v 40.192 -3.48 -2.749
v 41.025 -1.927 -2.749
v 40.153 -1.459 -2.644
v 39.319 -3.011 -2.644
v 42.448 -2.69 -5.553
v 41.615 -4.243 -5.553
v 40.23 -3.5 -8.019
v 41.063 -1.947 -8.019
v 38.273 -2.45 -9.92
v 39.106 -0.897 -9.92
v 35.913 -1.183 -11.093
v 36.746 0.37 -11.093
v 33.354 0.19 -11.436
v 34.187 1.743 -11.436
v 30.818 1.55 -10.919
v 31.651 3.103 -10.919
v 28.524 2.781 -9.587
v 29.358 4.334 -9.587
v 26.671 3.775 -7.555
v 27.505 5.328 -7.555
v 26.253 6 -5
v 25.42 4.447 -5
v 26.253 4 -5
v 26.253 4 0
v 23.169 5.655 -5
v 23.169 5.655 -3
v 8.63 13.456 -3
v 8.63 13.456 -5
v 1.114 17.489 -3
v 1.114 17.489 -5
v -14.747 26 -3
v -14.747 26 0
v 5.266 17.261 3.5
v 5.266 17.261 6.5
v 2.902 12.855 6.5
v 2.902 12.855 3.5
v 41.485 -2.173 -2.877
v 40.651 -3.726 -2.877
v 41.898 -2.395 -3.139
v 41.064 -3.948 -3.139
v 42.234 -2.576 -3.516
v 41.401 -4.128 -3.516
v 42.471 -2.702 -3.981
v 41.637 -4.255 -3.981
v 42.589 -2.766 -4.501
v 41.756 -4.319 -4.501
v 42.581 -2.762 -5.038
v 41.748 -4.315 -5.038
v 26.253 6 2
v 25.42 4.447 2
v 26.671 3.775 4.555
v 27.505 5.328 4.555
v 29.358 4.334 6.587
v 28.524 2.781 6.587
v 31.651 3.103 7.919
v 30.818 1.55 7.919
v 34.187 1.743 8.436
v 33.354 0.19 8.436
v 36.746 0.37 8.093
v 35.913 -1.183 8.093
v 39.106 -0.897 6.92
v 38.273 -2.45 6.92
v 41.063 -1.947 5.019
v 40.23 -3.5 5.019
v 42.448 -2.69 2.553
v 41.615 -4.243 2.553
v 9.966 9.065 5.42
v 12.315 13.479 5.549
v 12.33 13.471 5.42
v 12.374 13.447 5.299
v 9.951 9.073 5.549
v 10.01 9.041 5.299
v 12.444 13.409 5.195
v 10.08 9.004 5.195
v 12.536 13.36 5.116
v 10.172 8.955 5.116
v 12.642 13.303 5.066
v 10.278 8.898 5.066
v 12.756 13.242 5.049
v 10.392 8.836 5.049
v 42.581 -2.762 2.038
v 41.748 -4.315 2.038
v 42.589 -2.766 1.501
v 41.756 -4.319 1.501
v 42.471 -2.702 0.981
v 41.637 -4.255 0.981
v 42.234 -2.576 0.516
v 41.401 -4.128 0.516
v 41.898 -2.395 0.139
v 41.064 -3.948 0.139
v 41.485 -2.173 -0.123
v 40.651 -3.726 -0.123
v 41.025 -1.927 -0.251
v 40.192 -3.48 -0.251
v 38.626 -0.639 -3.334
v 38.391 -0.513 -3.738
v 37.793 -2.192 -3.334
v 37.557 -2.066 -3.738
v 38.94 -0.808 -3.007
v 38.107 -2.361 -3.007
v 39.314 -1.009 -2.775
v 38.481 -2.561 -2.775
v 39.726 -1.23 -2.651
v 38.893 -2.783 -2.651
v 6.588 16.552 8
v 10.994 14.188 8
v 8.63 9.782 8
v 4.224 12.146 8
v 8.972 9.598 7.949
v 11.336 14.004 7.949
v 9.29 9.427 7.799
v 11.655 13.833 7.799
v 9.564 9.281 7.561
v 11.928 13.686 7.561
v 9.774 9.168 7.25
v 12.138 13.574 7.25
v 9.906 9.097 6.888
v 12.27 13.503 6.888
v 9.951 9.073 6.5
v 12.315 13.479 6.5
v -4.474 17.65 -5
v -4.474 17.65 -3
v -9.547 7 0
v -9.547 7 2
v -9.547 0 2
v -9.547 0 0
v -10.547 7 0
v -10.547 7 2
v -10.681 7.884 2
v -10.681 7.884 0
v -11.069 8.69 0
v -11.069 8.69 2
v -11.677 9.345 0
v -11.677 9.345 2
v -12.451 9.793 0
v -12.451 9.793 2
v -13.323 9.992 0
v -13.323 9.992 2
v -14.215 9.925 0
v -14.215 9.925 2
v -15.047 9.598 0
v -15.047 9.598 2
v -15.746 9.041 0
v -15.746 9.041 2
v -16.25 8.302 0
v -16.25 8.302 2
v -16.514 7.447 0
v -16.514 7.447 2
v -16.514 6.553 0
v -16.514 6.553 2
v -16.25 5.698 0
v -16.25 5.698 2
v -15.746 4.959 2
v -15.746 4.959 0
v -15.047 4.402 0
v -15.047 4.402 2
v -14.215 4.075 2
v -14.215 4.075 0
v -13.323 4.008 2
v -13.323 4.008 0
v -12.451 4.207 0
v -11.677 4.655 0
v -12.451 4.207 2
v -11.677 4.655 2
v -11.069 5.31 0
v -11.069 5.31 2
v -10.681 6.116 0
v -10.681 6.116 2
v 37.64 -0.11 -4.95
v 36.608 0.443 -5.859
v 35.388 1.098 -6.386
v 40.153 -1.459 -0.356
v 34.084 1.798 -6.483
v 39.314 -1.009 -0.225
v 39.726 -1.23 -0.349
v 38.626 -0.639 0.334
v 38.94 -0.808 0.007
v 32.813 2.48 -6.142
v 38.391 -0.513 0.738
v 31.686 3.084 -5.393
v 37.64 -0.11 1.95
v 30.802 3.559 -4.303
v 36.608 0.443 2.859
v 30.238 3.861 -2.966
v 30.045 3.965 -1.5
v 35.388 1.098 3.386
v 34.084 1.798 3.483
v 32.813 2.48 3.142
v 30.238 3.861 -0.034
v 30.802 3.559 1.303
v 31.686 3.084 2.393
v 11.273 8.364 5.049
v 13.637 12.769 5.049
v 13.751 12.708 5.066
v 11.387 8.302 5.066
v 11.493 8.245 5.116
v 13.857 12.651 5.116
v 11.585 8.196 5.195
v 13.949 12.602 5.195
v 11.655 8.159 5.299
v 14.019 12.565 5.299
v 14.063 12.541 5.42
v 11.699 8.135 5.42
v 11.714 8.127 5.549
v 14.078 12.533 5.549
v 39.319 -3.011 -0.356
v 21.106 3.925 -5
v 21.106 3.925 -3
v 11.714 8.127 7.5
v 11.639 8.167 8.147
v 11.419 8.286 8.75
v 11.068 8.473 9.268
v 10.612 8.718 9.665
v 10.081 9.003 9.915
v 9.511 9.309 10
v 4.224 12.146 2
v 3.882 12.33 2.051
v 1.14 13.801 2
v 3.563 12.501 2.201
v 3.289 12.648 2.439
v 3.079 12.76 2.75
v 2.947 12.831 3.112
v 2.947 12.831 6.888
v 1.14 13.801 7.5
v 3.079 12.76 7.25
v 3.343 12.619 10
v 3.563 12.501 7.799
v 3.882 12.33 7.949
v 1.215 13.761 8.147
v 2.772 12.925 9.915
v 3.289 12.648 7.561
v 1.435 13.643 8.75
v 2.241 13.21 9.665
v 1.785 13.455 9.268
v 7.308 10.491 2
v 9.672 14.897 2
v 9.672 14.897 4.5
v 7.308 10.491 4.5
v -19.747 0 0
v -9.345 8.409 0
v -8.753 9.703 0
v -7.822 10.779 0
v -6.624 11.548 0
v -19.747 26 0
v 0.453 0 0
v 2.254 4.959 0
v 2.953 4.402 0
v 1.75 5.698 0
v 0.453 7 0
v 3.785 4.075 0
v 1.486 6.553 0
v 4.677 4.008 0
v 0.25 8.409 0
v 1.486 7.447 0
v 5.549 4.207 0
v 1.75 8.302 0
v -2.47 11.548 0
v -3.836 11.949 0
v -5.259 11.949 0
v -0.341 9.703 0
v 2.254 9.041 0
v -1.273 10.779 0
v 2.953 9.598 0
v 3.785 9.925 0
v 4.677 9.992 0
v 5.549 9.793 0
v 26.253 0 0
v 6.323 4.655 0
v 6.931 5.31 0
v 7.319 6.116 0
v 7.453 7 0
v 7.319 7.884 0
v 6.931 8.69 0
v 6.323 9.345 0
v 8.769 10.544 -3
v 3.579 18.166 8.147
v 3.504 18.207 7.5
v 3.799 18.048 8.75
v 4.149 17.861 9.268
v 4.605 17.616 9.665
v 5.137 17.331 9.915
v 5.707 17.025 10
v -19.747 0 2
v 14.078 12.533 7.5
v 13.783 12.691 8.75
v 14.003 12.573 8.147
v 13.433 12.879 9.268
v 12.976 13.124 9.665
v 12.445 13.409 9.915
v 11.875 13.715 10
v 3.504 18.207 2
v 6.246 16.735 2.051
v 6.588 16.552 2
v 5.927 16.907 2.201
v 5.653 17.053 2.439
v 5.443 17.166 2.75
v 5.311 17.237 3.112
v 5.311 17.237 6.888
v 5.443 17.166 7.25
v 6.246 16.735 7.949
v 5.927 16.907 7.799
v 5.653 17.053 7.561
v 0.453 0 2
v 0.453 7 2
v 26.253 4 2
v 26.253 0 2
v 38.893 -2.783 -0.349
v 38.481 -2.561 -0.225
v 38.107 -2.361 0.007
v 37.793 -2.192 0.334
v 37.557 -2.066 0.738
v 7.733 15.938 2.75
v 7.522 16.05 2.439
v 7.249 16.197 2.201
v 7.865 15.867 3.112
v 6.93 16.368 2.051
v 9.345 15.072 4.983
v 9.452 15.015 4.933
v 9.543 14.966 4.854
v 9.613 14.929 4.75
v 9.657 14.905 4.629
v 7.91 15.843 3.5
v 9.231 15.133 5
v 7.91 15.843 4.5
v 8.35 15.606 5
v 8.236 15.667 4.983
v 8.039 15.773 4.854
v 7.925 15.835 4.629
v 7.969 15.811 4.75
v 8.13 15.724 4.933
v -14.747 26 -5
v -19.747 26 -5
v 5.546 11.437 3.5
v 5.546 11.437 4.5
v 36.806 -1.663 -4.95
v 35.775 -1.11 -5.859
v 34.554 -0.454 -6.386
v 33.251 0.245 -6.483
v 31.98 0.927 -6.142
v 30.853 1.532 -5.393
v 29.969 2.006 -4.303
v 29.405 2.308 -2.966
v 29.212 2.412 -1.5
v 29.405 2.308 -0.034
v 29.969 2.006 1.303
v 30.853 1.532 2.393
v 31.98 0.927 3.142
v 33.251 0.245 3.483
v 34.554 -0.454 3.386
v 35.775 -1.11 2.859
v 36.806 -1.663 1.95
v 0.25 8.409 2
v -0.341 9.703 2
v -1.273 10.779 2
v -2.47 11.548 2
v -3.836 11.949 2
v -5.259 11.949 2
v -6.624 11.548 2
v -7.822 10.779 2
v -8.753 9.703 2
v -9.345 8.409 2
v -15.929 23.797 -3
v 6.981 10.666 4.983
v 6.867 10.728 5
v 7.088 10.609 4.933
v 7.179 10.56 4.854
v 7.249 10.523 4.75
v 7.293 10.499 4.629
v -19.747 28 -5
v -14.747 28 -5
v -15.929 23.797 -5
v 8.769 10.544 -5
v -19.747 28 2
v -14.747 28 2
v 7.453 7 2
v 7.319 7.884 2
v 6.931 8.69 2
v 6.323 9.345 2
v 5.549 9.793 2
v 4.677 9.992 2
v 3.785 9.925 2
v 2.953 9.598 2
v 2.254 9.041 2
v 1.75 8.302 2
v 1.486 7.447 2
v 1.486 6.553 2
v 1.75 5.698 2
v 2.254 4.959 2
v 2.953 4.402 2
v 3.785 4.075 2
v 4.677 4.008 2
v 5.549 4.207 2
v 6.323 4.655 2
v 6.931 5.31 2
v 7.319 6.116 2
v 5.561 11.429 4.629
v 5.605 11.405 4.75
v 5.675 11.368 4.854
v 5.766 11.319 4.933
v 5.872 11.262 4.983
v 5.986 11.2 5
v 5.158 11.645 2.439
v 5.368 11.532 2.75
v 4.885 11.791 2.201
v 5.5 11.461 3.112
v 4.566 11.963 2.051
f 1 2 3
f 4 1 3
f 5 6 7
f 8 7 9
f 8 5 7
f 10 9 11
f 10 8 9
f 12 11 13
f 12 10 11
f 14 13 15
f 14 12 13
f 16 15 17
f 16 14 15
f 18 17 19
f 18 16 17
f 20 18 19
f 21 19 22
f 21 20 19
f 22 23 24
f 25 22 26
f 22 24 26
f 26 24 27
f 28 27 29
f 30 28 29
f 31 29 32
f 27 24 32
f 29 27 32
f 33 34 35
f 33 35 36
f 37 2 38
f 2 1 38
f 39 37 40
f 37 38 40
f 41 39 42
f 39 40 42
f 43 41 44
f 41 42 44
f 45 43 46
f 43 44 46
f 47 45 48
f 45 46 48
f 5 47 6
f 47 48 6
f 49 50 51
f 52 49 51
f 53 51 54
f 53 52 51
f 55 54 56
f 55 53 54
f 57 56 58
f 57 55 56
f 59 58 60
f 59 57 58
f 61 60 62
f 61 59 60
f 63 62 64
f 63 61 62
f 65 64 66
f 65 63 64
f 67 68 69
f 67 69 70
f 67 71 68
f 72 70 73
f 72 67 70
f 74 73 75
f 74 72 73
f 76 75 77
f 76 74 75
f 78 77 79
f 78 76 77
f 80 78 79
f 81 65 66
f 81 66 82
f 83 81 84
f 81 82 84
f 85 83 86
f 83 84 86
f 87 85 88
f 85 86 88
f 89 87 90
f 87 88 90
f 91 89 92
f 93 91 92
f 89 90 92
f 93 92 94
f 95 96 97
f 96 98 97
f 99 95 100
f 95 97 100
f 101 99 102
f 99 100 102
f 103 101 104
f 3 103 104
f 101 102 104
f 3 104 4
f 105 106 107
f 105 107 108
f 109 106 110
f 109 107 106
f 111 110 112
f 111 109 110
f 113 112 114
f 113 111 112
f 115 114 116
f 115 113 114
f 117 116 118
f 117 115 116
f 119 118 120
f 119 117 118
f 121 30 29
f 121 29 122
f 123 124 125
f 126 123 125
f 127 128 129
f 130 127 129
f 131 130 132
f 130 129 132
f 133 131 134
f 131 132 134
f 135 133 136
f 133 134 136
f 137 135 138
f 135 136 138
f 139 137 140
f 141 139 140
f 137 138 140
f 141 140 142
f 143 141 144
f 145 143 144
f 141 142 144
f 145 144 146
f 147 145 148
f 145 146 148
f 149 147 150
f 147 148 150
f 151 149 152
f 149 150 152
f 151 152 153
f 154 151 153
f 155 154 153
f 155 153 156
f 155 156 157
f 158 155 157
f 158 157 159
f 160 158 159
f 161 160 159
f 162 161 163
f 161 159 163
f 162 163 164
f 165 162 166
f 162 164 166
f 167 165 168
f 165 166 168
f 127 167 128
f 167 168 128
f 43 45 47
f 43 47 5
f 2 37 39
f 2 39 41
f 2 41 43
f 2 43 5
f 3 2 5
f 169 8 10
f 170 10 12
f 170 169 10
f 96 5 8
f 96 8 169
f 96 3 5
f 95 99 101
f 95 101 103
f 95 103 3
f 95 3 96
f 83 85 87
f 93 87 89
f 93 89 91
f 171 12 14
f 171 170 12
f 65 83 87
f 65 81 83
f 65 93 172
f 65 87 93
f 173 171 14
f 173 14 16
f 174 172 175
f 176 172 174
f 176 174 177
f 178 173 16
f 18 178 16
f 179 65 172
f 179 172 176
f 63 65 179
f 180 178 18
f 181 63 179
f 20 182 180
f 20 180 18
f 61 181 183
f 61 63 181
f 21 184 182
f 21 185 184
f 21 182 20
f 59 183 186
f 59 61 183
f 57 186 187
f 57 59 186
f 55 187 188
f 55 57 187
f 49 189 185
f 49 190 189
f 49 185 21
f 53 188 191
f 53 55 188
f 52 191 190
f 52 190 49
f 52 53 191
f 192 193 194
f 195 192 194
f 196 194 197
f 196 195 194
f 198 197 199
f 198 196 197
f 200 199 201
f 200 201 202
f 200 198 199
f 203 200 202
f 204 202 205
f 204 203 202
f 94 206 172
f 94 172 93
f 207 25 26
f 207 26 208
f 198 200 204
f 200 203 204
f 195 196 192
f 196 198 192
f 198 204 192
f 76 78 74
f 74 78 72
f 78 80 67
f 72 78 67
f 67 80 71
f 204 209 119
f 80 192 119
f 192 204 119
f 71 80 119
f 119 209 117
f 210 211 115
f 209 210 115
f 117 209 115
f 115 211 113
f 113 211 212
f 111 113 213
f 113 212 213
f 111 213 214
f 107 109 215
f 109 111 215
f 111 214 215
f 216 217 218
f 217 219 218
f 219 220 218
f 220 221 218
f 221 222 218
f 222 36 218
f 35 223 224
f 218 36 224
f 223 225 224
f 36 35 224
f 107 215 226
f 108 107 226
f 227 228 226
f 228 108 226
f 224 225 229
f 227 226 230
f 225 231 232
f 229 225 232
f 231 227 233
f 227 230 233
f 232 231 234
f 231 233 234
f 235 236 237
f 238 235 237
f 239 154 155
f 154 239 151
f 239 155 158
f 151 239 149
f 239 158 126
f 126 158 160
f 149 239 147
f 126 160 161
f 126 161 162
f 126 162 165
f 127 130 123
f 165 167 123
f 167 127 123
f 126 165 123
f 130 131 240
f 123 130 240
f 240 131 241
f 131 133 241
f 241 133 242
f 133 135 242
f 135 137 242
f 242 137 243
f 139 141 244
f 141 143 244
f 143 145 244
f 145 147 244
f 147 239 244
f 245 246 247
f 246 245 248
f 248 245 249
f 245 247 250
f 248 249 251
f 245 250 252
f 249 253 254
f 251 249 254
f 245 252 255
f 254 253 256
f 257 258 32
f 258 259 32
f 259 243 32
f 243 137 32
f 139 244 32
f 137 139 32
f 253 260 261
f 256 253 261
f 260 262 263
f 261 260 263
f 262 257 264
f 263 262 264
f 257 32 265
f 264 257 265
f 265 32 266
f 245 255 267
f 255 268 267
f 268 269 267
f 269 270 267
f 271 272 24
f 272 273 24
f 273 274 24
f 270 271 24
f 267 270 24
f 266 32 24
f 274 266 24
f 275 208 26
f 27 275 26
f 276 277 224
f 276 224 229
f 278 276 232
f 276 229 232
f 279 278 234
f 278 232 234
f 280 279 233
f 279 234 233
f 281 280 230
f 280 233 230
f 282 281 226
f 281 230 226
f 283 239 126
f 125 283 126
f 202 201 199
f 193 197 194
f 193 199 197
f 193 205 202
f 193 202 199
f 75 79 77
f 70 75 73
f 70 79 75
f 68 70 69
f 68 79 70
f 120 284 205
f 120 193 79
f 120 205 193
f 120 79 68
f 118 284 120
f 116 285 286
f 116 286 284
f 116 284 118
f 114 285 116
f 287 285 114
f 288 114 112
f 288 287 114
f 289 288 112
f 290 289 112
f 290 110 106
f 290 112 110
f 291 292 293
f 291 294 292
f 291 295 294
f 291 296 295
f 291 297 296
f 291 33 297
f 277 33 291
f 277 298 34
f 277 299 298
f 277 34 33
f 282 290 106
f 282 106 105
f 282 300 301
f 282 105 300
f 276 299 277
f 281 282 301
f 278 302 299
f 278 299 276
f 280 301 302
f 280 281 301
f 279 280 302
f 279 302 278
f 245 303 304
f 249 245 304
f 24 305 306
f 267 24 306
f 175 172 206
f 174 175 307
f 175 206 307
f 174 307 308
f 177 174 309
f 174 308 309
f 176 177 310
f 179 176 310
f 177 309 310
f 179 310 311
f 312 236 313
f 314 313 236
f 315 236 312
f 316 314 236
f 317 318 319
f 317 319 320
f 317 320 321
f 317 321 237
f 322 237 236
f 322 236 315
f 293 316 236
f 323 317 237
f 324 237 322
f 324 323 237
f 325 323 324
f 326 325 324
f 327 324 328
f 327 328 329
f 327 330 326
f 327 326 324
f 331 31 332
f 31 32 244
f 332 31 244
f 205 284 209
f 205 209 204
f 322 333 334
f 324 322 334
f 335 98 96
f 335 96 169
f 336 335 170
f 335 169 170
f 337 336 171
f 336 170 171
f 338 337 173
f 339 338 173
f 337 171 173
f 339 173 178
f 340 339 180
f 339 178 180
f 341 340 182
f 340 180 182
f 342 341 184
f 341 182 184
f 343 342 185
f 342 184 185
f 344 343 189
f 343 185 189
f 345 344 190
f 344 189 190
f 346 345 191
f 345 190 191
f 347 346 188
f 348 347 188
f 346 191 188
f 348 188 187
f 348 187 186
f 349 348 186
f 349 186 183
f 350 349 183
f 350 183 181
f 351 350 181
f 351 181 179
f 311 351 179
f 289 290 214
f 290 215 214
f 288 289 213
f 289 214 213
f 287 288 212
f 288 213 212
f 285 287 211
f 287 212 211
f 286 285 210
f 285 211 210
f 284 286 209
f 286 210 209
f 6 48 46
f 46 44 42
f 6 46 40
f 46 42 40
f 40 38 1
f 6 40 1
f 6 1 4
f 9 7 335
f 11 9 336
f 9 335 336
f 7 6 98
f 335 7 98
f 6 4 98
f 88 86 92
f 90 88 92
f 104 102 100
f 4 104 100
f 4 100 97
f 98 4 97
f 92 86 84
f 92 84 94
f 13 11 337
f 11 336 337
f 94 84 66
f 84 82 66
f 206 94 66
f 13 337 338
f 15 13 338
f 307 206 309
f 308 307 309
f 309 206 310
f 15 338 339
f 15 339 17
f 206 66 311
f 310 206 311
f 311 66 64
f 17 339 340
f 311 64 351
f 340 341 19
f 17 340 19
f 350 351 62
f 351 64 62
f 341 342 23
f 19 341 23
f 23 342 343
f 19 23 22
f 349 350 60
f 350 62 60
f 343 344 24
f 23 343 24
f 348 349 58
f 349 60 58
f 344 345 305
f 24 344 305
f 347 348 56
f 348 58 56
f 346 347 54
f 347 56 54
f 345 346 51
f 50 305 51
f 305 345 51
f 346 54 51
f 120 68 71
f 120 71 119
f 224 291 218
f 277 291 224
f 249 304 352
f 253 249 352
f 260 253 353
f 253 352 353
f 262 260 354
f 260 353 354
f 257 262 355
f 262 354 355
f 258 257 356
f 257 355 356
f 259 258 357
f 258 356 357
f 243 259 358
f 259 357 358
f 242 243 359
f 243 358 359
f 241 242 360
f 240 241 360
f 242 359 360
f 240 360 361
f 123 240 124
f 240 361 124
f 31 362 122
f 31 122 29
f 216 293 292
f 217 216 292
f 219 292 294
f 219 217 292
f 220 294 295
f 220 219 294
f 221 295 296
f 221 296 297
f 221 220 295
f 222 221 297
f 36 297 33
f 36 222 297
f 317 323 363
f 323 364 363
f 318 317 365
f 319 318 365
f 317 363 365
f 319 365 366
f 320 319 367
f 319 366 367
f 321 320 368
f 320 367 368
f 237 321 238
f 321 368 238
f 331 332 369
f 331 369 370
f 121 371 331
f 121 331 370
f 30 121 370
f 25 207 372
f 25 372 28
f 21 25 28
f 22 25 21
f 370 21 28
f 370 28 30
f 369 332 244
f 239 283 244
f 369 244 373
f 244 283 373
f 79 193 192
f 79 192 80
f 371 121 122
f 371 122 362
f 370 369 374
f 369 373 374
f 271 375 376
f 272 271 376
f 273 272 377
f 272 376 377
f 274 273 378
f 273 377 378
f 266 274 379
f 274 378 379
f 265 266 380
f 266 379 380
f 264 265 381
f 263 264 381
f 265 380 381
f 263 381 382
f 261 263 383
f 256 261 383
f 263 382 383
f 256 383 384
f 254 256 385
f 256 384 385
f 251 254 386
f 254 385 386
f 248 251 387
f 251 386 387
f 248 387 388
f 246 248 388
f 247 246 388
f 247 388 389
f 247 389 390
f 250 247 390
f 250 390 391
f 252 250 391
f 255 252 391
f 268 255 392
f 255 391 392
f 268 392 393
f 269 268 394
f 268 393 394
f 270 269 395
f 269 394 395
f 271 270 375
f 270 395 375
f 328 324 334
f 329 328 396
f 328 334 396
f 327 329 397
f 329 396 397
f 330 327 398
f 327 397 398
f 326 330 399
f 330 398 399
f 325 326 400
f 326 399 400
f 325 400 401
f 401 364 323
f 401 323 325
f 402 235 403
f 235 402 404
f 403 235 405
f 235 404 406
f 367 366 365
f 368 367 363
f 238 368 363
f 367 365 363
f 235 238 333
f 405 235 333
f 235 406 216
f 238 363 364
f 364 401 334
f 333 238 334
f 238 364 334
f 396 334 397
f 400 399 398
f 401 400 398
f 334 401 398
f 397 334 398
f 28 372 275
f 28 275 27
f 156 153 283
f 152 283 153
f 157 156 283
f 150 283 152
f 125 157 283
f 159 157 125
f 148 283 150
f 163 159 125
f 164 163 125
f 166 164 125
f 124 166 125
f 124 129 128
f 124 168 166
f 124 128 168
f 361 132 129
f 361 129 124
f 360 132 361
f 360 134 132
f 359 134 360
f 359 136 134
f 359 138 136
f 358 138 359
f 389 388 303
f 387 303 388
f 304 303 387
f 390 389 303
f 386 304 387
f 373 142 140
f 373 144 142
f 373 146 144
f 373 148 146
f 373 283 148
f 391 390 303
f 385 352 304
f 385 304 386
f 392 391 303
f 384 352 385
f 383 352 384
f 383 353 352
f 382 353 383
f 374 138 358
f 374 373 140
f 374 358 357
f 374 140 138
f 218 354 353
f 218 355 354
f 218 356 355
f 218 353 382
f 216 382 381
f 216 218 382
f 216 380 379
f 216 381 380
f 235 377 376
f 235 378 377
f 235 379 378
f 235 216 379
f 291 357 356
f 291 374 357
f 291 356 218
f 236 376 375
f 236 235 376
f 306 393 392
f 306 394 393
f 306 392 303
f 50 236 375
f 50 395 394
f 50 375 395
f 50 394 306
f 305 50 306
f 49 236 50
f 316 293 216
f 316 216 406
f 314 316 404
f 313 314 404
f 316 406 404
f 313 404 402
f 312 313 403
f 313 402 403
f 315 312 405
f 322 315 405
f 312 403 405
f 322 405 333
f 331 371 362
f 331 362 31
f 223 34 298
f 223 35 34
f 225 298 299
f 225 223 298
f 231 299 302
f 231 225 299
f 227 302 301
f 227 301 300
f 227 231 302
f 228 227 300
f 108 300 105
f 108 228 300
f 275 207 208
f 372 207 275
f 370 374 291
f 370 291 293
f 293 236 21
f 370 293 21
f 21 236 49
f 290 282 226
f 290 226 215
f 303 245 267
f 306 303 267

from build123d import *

# Parameters (mm, degrees)
F1_DEPTH  = 2
F2_R      = 3
F3_DEPTH  = 2
F4_W      = 2
F4_H      = 3
F5_DEPTH  = 5
F6_R      = 2.5
F7_R      = 1.49999
F8_R      = 0.5
F10_DEPTH = 5
F12_DEPTH = 2
F13_R     = 9.9401429079
F13_R_2   = 5
F14_DEPTH = 1.7623205361
F16_DEPTH = 1.7623205361
F17_R     = 2


# Not quite as in the source:
# - a fillet or chamfer is up to 0.001 mm smaller than in the source, because OpenCascade refuses the exact size


with BuildPart() as f1:
    # F0 (on Top) → F1 (new body)
    with BuildSketch(Plane.XY):
        Polygon((-19.7472184807, 28), (-19.7472184807, 0), (26.2527815193, 0), (26.2527815193, 6), (-14.7472184807, 28), align=None)
    extrude(amount=F1_DEPTH)

    # F2 (on face) → F3 (cut, through all)
    with BuildSketch(Plane.XY.offset(2)):
        with Locations((-13.5472184807, 7)):
            Circle(F2_R)
        with Locations((4.4527815193, 7)):
            Circle(F2_R)
        with BuildLine():
            Line((-9.5472184807, 7), (-9.5472184807, 0))
            Line((-9.5472184807, 0), (0.4527815193, 0))
            Line((0.4527815193, 0), (0.4527815193, 7))
            ThreePointArc((0.4527815193, 7), (-4.5472184807, 12), (-9.5472184807, 7))
        make_face()
    extrude(amount=-F3_DEPTH, mode=Mode.SUBTRACT)

    # F4 (on face) → F5 (join)
    with BuildSketch(Plane(origin=(8.3687511572, 15.5963089748, 0), x_dir=(-0.8811602681, 0.4728177048, 0), z_dir=(0.4728177048, 0.8811602681, 0))):
        Polygon((3.5210567079, 2), (5.5210567079, 2), (5.5210567079, 10), (-6.4789432921, 10), (-6.4789432921, 5.0490344875), (-4.4789432921, 5.0490344875), (-4.4789432921, 8), (3.5210567079, 8), align=None)
        with Locations((-0.4789432921, 3.5)):
            Rectangle(F4_W, F4_H)
    extrude(amount=-F5_DEPTH)

    # F6
    f6_edges = [f1.edges().sort_by_distance(p)[0] for p in [
        (12.895694, 10.330049, 10),
        (2.321771, 16.003862, 10),
    ]]
    fillet(f6_edges, radius=F6_R)

    # F7 (radius 1.5 in the source; OpenCascade refuses exactly that, so slightly less here)
    f7_edges = [f1.edges().sort_by_distance(p)[0] for p in [
        (6.727572, 13.639773, 2),
        (4.084092, 15.058226, 2),
        (11.133374, 11.275685, 8),
        (4.084092, 15.058226, 8),
    ]]
    fillet(f7_edges, radius=F7_R)

    # F8
    f8_edges = [f1.edges().sort_by_distance(p)[0] for p in [
        (12.895694, 10.330049, 5.049034),
        (11.133374, 11.275685, 5.049034),
        (8.489893, 12.694138, 5),
        (6.727572, 13.639773, 5),
    ]]
    fillet(f8_edges, radius=F8_R)

    # F9 (on face) → F10 (join)
    with BuildSketch(Plane(origin=(0, 0, 0), x_dir=(1, 0, 0), z_dir=(0, 0, -1))):
        Polygon((-19.7472184807, -26), (-19.7472184807, -28), (-14.7472184807, -28), (26.2527815193, -6), (26.2527815193, -4), (-14.7472184807, -26), align=None)
    extrude(amount=F10_DEPTH)

    # F11 (on face) → F12 (join)
    with BuildSketch(Plane(origin=(0, 0, -5), x_dir=(1, 0, 0), z_dir=(0, 0, -1))):
        Polygon((-15.9292627427, -23.7970993298), (-14.7472184807, -26), (1.1136663445, -17.4892813133), (-4.4741792579, -17.6504691673), align=None)
        Polygon((8.6295761581, -13.4563540963), (23.1687205811, -5.6548619669), (21.105516051, -3.9247790015), (8.7692722981, -10.5442268689), align=None)
    extrude(amount=-F12_DEPTH)

    # F13 (on face) → F14 (join, through all)
    with BuildSketch(Plane(origin=(8.3687511572, 15.5963089748, 0), x_dir=(-0.8811602681, 0.4728177048, 0), z_dir=(0.4728177048, 0.8811602681, 0))):
        with Locations((-29.5995731847, -1.5)):
            Circle(F13_R)
        with Locations((-29.5995731847, -1.5)):
            Circle(F13_R_2, mode=Mode.SUBTRACT)
    extrude(amount=-F14_DEPTH)

    # F15 (on face) → F16 (cut, through all)
    with BuildSketch(Plane(origin=(8.3687511572, 15.5963089748, 0), x_dir=(-0.8811602681, 0.4728177048, 0), z_dir=(0.4728177048, 0.8811602681, 0))):
        with BuildLine():
            ThreePointArc((-34.5031041583, -2.4774374616), (-34.5995731847, -1.5), (-34.5031041583, -0.5225625384))
            Line((-34.5031041583, -0.5225625384), (-39.4258868897, 0))
            ThreePointArc((-39.4258868897, 0), (-39.5397160926, -1.5), (-39.4258868897, -3))
            Line((-39.4258868897, -3), (-34.5031041583, -2.4774374616))
        make_face()
    extrude(amount=-F16_DEPTH, mode=Mode.SUBTRACT)

    # F17
    f17_edges = [f1.edges().sort_by_distance(p)[0] for p in [
        (42.692648, -3.821392, -3),
        (42.692648, -3.821392, 0),
        (38.354887, -1.493813, -0.522563),
        (38.354887, -1.493813, -2.477437),
    ]]
    fillet(f17_edges, radius=F17_R)


solid = f1.part
